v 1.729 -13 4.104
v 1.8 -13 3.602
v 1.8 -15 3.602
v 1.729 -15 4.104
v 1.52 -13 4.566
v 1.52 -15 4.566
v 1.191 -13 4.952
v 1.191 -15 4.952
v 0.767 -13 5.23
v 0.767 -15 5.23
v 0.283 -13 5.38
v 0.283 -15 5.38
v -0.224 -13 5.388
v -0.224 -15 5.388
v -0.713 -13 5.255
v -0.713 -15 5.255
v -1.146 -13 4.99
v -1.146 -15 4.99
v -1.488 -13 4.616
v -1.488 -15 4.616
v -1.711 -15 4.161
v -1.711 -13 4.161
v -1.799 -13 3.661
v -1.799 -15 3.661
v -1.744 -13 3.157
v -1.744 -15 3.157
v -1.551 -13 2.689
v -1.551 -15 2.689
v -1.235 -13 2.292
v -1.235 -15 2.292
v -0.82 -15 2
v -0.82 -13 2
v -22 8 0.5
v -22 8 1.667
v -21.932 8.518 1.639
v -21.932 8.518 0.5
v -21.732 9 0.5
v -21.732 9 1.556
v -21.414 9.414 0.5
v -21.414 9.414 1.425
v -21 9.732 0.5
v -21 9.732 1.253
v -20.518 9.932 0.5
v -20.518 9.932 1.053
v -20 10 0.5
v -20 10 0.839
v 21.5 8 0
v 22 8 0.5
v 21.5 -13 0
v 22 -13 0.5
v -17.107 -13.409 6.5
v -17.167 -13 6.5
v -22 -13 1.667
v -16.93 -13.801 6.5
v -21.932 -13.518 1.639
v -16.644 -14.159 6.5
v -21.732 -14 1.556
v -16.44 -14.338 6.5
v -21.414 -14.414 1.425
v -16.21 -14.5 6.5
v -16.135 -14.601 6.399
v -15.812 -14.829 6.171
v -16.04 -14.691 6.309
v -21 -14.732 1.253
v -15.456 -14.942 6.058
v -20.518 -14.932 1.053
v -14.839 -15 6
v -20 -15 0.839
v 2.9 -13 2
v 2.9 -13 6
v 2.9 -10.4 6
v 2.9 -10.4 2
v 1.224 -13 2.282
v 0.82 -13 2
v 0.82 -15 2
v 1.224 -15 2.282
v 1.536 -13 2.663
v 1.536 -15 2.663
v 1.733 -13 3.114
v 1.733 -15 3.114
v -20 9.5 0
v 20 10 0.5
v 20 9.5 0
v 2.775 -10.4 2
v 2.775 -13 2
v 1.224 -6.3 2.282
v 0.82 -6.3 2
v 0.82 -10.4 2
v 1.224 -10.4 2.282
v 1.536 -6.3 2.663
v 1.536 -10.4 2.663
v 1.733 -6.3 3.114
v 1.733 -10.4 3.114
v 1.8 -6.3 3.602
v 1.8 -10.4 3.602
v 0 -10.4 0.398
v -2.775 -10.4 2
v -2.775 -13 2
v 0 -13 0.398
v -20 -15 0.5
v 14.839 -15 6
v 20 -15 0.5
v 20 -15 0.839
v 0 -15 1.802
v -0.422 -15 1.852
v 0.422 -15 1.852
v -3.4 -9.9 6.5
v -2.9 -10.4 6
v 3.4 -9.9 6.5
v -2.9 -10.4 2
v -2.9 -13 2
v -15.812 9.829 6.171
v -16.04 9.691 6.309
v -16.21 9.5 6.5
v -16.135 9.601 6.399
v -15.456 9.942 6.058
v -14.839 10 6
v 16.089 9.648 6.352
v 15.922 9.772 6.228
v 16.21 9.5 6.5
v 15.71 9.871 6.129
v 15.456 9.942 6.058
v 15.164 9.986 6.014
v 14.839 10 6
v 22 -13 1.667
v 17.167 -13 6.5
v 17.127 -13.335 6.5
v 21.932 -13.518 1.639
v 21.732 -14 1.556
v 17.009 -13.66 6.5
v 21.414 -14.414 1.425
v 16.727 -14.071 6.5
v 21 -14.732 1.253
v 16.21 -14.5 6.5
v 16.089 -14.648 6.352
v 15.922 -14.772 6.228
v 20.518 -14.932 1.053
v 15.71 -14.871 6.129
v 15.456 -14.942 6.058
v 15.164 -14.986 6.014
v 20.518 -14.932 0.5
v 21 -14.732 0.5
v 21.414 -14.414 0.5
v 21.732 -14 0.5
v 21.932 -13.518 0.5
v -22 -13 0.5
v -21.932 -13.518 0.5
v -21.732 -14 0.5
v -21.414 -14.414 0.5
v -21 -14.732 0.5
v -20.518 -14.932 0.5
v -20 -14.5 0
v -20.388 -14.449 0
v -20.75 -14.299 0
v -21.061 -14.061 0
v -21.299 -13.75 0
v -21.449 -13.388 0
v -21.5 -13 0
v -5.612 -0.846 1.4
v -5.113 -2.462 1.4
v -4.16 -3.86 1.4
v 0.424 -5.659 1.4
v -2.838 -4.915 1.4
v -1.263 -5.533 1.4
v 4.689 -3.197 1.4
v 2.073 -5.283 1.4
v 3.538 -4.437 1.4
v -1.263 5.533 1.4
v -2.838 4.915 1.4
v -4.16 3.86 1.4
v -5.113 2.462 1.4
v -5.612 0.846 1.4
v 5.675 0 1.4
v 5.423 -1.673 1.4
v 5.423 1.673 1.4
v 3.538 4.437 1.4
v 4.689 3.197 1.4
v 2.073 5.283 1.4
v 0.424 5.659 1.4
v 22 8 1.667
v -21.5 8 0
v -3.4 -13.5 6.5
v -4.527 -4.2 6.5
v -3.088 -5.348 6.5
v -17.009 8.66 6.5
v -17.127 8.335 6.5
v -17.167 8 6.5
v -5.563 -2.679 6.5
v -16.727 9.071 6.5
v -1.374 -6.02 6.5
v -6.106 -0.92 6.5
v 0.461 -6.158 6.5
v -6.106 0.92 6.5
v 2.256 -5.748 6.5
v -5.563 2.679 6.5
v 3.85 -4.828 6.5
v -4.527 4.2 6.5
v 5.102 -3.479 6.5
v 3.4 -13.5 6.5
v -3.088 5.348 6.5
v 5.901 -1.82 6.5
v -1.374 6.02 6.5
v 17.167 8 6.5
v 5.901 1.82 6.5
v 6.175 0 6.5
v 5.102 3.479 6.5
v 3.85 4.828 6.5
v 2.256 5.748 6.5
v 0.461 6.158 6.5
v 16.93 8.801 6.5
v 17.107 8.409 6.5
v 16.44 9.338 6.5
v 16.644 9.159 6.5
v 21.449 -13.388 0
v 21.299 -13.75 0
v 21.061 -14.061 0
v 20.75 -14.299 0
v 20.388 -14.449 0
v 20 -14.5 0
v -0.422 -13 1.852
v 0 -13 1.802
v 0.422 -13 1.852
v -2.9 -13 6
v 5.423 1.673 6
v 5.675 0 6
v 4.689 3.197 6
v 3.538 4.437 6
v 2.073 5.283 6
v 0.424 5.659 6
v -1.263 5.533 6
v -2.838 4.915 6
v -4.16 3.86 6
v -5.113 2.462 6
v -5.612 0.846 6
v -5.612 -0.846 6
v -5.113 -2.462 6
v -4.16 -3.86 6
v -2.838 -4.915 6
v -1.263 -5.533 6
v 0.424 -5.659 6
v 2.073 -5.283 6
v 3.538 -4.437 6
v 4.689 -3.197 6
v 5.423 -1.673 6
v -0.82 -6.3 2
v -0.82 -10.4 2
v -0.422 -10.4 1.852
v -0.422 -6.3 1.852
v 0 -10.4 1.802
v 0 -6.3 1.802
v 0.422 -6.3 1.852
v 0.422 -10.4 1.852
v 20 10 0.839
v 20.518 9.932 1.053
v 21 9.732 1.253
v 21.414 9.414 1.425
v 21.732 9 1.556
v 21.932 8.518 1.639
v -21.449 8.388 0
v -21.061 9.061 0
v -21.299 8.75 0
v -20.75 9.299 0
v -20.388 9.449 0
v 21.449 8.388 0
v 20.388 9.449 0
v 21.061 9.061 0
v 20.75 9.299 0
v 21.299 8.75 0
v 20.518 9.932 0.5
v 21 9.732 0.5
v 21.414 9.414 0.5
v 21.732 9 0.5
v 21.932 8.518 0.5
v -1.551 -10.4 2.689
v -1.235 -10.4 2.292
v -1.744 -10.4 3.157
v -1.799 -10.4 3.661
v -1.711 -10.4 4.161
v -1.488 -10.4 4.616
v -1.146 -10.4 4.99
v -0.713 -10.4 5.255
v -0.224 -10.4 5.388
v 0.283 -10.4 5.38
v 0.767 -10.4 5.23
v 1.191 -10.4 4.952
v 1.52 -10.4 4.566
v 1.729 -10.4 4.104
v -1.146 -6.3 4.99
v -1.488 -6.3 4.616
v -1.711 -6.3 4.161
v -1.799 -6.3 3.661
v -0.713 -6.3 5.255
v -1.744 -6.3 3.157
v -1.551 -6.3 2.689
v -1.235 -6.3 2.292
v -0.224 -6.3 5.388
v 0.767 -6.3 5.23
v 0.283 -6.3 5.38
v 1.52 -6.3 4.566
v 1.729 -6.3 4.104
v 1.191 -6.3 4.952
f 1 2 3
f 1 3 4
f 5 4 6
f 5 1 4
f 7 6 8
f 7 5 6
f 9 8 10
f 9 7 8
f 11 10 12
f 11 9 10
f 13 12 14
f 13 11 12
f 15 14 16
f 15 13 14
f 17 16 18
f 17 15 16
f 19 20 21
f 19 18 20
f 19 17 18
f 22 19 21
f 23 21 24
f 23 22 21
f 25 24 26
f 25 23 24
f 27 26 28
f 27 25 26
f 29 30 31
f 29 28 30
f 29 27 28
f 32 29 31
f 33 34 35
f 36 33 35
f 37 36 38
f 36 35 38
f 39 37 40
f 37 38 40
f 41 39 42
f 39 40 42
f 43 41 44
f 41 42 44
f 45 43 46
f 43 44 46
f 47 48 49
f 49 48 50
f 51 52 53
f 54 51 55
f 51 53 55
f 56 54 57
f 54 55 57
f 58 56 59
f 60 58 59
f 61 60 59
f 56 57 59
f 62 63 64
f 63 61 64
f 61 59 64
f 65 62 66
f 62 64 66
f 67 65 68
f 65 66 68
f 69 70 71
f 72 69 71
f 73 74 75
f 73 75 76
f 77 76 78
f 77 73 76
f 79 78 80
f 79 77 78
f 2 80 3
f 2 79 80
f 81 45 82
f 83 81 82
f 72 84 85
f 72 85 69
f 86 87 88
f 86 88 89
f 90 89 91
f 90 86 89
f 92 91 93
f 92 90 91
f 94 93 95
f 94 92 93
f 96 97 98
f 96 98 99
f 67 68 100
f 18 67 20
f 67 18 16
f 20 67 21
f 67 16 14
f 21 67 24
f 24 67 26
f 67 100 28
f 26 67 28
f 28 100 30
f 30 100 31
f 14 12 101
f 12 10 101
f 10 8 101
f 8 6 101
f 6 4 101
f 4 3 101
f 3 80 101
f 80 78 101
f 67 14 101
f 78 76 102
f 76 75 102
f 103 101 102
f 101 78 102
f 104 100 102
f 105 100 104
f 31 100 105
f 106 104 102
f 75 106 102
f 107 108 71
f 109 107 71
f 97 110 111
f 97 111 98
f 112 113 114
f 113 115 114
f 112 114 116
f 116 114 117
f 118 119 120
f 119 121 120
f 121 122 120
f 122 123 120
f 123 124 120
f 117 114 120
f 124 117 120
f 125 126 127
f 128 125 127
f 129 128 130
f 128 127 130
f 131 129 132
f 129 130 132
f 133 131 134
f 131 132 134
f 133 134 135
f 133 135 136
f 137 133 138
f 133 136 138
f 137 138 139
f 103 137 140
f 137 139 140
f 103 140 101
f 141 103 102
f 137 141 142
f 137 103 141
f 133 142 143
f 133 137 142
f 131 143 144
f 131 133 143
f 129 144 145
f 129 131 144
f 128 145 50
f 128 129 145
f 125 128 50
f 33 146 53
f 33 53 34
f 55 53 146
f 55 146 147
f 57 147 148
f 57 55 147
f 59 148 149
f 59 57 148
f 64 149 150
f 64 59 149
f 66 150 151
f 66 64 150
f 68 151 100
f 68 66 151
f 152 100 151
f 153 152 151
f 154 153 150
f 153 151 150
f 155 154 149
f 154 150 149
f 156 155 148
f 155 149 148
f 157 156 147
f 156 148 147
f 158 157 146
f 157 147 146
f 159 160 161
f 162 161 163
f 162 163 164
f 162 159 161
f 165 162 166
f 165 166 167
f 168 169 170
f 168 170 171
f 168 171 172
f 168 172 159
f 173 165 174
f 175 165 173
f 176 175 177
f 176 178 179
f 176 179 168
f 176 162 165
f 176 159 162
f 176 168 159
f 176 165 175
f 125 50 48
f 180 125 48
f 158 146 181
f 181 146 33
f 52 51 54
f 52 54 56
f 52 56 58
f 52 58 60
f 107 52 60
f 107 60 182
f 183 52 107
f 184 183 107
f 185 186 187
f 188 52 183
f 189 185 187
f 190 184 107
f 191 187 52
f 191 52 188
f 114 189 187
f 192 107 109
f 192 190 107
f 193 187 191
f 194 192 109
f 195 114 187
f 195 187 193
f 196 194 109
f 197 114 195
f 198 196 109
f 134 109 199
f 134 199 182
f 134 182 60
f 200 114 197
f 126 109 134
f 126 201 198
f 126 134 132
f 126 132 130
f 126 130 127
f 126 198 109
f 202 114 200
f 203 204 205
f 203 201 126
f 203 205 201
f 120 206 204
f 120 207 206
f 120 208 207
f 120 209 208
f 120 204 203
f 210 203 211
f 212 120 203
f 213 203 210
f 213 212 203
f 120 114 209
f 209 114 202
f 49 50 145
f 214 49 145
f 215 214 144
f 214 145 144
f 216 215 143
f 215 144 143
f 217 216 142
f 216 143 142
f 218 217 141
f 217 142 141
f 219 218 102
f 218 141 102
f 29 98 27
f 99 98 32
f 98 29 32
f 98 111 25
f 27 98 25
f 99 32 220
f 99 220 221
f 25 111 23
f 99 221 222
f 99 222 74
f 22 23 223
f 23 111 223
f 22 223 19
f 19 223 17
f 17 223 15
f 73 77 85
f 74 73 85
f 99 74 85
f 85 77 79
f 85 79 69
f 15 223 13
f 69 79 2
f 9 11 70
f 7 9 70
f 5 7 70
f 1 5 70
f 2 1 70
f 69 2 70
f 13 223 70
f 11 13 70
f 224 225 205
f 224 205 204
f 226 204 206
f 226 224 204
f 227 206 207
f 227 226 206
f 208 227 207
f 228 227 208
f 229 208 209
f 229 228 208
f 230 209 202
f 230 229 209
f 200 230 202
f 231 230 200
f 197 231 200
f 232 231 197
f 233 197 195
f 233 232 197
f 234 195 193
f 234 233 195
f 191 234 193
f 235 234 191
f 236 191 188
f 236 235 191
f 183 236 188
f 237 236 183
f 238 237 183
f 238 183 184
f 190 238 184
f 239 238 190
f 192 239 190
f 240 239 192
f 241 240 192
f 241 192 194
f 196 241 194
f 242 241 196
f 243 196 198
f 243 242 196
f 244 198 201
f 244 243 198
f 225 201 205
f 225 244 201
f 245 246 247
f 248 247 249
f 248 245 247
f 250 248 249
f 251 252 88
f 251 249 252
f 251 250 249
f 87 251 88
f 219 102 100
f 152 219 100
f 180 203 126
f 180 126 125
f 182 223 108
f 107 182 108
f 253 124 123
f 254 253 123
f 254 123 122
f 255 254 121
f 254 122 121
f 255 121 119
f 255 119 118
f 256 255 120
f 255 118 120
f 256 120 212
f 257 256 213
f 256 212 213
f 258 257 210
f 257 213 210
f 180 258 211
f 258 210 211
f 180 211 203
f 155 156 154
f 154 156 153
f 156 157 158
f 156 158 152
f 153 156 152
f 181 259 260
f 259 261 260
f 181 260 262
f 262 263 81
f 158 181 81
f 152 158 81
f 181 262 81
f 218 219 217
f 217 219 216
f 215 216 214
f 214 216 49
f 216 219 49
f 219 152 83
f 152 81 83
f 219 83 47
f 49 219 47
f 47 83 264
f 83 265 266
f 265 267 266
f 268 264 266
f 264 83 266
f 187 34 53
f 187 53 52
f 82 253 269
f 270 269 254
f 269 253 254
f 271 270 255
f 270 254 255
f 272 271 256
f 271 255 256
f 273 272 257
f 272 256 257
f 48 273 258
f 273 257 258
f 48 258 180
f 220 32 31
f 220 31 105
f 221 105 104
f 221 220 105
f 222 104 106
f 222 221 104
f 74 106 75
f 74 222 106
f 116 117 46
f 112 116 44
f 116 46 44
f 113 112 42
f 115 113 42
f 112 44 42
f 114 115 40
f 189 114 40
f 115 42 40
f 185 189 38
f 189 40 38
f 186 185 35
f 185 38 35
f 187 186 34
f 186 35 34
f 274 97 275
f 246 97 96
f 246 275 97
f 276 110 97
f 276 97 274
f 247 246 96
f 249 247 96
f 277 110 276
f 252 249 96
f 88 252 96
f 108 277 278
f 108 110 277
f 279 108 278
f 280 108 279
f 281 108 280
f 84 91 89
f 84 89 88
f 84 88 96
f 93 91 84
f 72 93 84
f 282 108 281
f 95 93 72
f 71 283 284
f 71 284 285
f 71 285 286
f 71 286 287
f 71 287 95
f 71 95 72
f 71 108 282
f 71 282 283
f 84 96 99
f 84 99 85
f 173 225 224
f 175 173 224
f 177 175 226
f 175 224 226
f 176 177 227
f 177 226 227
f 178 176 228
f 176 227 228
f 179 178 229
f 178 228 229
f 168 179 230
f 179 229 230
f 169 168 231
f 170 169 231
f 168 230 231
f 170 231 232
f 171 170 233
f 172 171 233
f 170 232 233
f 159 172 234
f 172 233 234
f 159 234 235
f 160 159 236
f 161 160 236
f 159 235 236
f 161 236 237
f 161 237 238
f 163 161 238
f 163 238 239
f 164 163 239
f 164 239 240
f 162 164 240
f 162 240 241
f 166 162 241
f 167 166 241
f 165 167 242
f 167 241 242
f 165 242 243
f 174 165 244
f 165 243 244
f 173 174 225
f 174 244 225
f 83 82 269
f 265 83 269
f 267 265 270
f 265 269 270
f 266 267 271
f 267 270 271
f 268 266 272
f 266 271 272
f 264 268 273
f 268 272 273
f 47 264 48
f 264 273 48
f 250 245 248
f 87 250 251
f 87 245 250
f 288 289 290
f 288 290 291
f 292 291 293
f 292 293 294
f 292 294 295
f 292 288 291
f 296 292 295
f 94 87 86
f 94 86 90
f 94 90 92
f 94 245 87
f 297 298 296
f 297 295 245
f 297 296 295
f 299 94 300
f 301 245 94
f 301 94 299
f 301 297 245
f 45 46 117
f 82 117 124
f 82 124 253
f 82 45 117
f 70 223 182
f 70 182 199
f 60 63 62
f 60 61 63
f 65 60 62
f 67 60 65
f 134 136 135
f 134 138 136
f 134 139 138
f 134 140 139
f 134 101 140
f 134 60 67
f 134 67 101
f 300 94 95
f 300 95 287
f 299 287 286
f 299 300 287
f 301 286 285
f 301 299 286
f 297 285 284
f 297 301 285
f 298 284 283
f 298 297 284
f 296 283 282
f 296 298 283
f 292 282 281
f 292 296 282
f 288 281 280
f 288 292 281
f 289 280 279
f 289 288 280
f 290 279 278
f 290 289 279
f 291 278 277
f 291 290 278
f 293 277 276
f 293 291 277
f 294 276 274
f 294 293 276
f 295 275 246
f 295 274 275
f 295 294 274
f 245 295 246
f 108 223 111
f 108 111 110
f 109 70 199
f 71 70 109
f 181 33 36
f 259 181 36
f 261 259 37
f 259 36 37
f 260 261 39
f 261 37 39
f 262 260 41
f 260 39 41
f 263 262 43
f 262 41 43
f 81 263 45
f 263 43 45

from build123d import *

# Parameters (mm, degrees)
SKIZZE1_W                            = 44
SKIZZE1_H                            = 25
AUFSATZ_LINEAR_AUSTRAGEN1_DEPTH      = 6.5
SKIZZE2_R                            = 5.675
SCHNITT_LINEAR_AUSTRAGEN1_DEPTH      = 5.1
VERRUNDUNG1_R                        = 2
SKIZZE8_W                            = 5.8
SKIZZE8_H                            = 2.6
SCHNITT_LINEAR_AUSTRAGEN5_DEPTH      = 4.5
SCHNITT_LINEAR_AUSTRAGEN6_DEPTH      = 2.6
SCHNITT_LINEAR_AUSTRAGEN7_DEPTH      = 31.698697041
SCHNITT_LINEAR_AUSTRAGEN7_DEPTH_BACK = 4.1
SCHNITT_LINEAR_AUSTRAGEN8_DEPTH      = 34.930075155
FASE1_SIZE                           = 0.5
VERRUNDUNG2_R                        = 2


with BuildPart() as part:
    # Skizze1 → Aufsatz-Linear austragen1 (new body)
    with BuildSketch(Plane.XY):
        with Locations((0, -2.5)):
            Rectangle(SKIZZE1_W, SKIZZE1_H)
    extrude(amount=AUFSATZ_LINEAR_AUSTRAGEN1_DEPTH)

    # Skizze2 → Schnitt-Linear austragen1 (cut)
    with BuildSketch(Plane.XY.offset(6.5)):
        Circle(SKIZZE2_R)
    extrude(amount=-SCHNITT_LINEAR_AUSTRAGEN1_DEPTH, mode=Mode.SUBTRACT)

    # Verrundung1
    verrundung1_edges = [part.edges().sort_by_distance(p)[0] for p in [
        (-22, 10, 3.25),
        (22, 10, 3.25),
        (22, -15, 3.25),
        (-22, -15, 3.25),
    ]]
    fillet(verrundung1_edges, radius=VERRUNDUNG1_R)

    # Skizze8 → Schnitt-Linear austragen5 (cut)
    with BuildSketch(Plane.XY.offset(6.5)):
        with Locations((0, -11.7)):
            Rectangle(SKIZZE8_W, SKIZZE8_H)
    extrude(amount=-SCHNITT_LINEAR_AUSTRAGEN5_DEPTH, mode=Mode.SUBTRACT)

    # Skizze9 → Schnitt-Linear austragen6 (cut)
    with BuildSketch(Plane.XZ.offset(10.4)):
        with BuildLine():
            Line((-0.820441954, 2), (-2.775, 2))
            Line((-2.775, 2), (0, 0.397853003))
            Line((0, 0.397853003), (2.775, 2))
            Line((2.775, 2), (0.820441954, 2))
            ThreePointArc((0.820441954, 2), (0, 1.802146997), (-0.820441954, 2))
        make_face()
        with BuildLine():
            ThreePointArc((1.8, 3.602146997), (-0.938936761, 5.137854573), (-0.820441954, 2))
            Line((-0.820441954, 2), (0.820441954, 2))
            ThreePointArc((0.820441954, 2), (1.535707576, 2.663210236), (1.8, 3.602146997))
        make_face()
        with BuildLine():
            Line((0.820441954, 2), (-0.820441954, 2))
            ThreePointArc((-0.820441954, 2), (0, 1.802146997), (0.820441954, 2))
        make_face()
    extrude(amount=SCHNITT_LINEAR_AUSTRAGEN6_DEPTH, mode=Mode.SUBTRACT)

    # Skizze9<3> → Schnitt-Linear austragen7 (cut, two sides: drawn at the far end of the back side and taken through both)
    with BuildSketch(Plane.XZ.offset(10.4).offset(-SCHNITT_LINEAR_AUSTRAGEN7_DEPTH_BACK)):
        with BuildLine():
            ThreePointArc((1.8, 3.602146997), (-0.938936761, 5.137854573), (-0.820441954, 2))
            Line((-0.820441954, 2), (0.820441954, 2))
            ThreePointArc((0.820441954, 2), (1.535707576, 2.663210236), (1.8, 3.602146997))
        make_face()
        with BuildLine():
            Line((0.820441954, 2), (-0.820441954, 2))
            ThreePointArc((-0.820441954, 2), (0, 1.802146997), (0.820441954, 2))
        make_face()
    extrude(amount=SCHNITT_LINEAR_AUSTRAGEN7_DEPTH + SCHNITT_LINEAR_AUSTRAGEN7_DEPTH_BACK, mode=Mode.SUBTRACT)

    # Skizze10 → Schnitt-Linear austragen8 (cut, through all)
    with BuildSketch(Plane.XZ.offset(15)):
        Polygon((-22, 1.667157288), (-17.167157288, 6.5), (-22, 6.5), align=None)
        Polygon((22, 1.667157288), (22, 6.5), (17.167157288, 6.5), align=None)
    extrude(amount=-SCHNITT_LINEAR_AUSTRAGEN8_DEPTH, mode=Mode.SUBTRACT)

    # Fase1
    fase1_edges = [part.edges().sort_by_distance(p)[0] for p in [
        (-5.675, 0, 6.5),
        (0, 10, 0),
        (-22, -2.5, 0),
        (22, -2.5, 0),
        (0, -15, 0),
        (-21.414213562, -14.414213562, 0),
        (-21.414213562, 9.414213562, 0),
        (21.414213562, -14.414213562, 0),
        (21.414213562, 9.414213562, 0),
        (2.9, -11.7, 6.5),
        (0, -10.4, 6.5),
        (-2.9, -11.7, 6.5),
        (0, -13, 6.5),
        (0, 10, 6.5),
        (0, -15, 6.5),
    ]]
    chamfer(fase1_edges, length=FASE1_SIZE)

    # Verrundung2
    # the kernel refuses this fillet: 2 mm, written as the material it takes off along each edge
    with BuildSketch(Plane(origin=(-23.535533906, 10, 0.131623382), x_dir=(0.7071067811865477, 0, -0.7071067811865477), z_dir=(0.7071067811865476, 0, 0.7071067811865476)), Plane(origin=(14.131623382, 10, 9.535533906), x_dir=(-0.7071067811865476, 0, -0.7071067811865476), z_dir=(0.7071067811865476, 0, -0.7071067811865475)), Plane(origin=(14.131623382, -15, 9.535533906), x_dir=(0, 1, 0), z_dir=(0.7071067811865476, 0, -0.7071067811865475)), Plane(origin=(-23.535533906, -15, 0.131623382), x_dir=(0, 1, 0), z_dir=(0.7071067811865476, 0, 0.7071067811865476))) as verrundung2_piece_1:
        with BuildLine():
            CenterArc((VERRUNDUNG2_R, -VERRUNDUNG2_R), VERRUNDUNG2_R, 90, 90)
            Line((0, -VERRUNDUNG2_R), (0, 0))
            Line((0, 0), (VERRUNDUNG2_R, 0))
        make_face()
    extrude(amount=13.299137803, mode=Mode.SUBTRACT)


solid = part.part
